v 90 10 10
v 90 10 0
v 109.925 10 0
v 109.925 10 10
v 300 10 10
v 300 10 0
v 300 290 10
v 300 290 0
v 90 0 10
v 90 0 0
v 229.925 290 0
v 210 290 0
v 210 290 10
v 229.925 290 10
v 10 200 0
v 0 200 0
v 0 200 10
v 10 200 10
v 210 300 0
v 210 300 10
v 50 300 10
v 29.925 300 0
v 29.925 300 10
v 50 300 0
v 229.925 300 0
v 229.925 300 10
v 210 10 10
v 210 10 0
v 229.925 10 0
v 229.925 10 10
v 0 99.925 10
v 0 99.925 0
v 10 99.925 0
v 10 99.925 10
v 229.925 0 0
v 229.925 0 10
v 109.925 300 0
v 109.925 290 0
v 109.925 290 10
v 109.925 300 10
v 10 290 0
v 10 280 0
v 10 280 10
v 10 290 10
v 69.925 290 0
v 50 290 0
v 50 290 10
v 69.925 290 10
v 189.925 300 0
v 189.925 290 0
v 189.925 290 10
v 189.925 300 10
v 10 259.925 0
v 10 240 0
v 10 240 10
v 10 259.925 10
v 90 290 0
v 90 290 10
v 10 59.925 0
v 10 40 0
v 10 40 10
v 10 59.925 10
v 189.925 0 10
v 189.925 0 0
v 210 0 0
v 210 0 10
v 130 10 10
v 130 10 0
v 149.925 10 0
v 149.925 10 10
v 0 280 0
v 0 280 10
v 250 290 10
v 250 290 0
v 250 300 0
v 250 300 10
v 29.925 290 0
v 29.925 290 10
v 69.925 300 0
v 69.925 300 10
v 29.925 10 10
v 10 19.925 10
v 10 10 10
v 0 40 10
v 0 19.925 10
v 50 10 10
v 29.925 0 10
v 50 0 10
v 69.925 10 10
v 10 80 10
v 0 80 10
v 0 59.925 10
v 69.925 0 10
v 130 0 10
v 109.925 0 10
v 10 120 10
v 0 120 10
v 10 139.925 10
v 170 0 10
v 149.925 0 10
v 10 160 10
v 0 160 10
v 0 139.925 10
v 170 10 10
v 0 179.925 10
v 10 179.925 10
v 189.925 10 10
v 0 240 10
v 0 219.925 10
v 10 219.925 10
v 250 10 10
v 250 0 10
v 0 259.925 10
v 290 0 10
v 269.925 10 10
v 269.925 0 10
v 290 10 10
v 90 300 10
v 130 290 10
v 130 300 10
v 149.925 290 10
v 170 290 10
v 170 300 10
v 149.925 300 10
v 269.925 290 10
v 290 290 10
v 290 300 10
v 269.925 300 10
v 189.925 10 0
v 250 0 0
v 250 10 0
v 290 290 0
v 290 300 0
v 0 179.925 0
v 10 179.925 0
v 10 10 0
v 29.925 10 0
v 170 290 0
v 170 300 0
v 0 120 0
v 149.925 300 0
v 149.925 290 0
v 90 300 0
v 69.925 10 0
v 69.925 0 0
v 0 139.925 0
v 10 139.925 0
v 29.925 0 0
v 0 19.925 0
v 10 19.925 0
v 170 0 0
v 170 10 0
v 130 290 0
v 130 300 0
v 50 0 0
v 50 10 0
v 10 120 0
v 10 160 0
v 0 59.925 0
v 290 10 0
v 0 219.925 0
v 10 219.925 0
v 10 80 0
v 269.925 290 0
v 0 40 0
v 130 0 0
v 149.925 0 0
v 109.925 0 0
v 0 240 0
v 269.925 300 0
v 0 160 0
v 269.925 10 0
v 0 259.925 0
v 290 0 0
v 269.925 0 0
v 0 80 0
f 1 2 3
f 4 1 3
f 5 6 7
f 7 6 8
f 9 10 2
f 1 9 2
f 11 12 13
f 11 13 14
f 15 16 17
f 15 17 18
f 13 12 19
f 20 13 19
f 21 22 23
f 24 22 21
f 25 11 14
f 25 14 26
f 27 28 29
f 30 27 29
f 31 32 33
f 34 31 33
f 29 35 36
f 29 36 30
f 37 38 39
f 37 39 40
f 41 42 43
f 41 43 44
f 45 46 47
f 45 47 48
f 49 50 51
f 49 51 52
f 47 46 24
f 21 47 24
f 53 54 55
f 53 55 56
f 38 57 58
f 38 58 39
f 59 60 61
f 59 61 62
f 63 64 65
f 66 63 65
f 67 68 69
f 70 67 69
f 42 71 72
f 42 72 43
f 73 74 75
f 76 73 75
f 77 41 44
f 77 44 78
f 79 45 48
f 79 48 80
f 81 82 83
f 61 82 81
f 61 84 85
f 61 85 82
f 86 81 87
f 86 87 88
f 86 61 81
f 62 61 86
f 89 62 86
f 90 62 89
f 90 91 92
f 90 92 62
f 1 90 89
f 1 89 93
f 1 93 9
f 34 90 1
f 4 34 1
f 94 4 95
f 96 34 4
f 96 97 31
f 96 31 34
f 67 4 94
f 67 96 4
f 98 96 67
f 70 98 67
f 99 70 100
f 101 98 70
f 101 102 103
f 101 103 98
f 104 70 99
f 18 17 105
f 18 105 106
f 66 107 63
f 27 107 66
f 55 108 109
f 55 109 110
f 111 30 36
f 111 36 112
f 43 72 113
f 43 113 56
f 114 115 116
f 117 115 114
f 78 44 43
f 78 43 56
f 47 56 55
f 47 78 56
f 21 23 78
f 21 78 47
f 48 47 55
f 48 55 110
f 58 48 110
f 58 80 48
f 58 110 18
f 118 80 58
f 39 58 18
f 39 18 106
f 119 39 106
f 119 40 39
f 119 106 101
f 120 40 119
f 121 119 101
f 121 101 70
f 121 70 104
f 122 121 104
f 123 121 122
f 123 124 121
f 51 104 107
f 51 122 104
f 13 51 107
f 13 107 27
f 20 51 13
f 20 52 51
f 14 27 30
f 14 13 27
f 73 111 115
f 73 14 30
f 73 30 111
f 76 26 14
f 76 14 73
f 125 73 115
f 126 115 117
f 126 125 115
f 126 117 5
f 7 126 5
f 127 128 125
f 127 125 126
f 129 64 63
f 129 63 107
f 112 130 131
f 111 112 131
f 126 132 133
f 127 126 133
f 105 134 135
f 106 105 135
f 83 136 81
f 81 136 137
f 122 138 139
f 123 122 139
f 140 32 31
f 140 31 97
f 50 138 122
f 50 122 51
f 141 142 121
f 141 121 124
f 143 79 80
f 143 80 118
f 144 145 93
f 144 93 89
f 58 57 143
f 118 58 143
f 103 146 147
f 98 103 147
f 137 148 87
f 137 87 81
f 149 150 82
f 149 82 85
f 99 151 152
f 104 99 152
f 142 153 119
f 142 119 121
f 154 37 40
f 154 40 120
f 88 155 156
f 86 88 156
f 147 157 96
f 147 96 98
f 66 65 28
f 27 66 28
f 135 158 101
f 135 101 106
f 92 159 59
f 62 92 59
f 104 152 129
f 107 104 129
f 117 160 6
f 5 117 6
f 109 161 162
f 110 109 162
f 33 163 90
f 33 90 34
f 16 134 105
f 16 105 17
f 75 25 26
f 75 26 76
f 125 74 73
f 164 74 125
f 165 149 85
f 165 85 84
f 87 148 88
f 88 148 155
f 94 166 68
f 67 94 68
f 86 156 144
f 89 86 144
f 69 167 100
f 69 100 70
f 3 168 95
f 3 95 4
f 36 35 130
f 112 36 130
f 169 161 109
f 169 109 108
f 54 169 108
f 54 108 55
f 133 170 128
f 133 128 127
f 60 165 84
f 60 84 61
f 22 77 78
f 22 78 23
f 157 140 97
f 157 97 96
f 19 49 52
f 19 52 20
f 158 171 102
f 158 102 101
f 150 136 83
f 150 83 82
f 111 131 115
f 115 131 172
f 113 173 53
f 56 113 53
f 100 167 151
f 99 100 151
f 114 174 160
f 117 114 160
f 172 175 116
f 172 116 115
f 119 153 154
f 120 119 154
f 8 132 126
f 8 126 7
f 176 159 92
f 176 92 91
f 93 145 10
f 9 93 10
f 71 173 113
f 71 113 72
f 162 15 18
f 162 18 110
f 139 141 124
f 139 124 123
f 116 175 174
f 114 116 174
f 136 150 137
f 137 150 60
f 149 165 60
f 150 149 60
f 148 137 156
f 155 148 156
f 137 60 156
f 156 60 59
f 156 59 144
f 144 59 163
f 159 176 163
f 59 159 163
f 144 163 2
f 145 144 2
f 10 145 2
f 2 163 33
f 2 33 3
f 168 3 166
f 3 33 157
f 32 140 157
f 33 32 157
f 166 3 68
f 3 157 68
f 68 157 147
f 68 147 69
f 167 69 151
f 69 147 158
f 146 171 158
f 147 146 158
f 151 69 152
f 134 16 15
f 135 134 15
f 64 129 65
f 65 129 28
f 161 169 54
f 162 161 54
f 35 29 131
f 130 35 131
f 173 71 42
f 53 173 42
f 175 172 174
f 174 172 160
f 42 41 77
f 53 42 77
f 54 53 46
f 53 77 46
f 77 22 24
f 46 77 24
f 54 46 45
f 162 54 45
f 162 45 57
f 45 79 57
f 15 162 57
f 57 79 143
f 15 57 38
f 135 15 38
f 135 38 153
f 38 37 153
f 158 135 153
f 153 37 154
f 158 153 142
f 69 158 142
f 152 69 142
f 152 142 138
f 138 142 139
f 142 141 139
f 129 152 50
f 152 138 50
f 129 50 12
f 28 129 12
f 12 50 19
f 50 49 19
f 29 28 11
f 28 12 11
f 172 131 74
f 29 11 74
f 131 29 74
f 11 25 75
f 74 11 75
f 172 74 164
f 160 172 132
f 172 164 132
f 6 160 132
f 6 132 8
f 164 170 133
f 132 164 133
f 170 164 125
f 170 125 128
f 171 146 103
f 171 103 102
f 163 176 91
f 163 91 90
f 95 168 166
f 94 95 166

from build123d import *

# Parameters (mm, degrees)
F0_W     = 300
F0_H     = 300
F1_DEPTH = 10
F2_W     = 10
F2_H     = 10
F2_W_2   = 19.925
F2_H_2   = 9.925
F2_H_3   = 19.925
F3_DEPTH = 10.001


with BuildPart() as f1:
    # F0 (on Top) → F1 (new body)
    with BuildSketch(Plane.XY):
        with Locations((150, 150)):
            Rectangle(F0_W, F0_H)
    extrude(amount=F1_DEPTH)

    # F2 (on face) → F3 (cut, through all)
    with BuildSketch(Plane.XY):
        with Locations((295, 295)):
            Rectangle(F2_W, F2_H)
        with Locations((259.9625, 295)):
            Rectangle(F2_W_2, F2_H)
        with Locations((219.9625, 295)):
            Rectangle(F2_W_2, F2_H)
        with Locations((179.9625, 295)):
            Rectangle(F2_W_2, F2_H)
        with Locations((139.9625, 295)):
            Rectangle(F2_W_2, F2_H)
        with Locations((99.9625, 295)):
            Rectangle(F2_W_2, F2_H)
        with Locations((59.9625, 295)):
            Rectangle(F2_W_2, F2_H)
        Polygon((29.925, 290), (29.925, 300), (-24.5567484915, 300), (-24.5567484915, 290), (0, 290), (0, 299.925), (10, 299.925), (10, 290), align=None)
        with Locations((5, 285)):
            Rectangle(F2_W, F2_H)
        with Locations((5, 294.9625)):
            Rectangle(F2_W, F2_H_2)
        with Locations((295, 5)):
            Rectangle(F2_W, F2_H)
        with Locations((259.9625, 5)):
            Rectangle(F2_W_2, F2_H)
        with Locations((219.9625, 5)):
            Rectangle(F2_W_2, F2_H)
        with Locations((179.9625, 5)):
            Rectangle(F2_W_2, F2_H)
        with Locations((139.9625, 5)):
            Rectangle(F2_W_2, F2_H)
        with Locations((99.9625, 5)):
            Rectangle(F2_W_2, F2_H)
        with Locations((59.9625, 5)):
            Rectangle(F2_W_2, F2_H)
        with Locations((19.9625, 5)):
            Rectangle(F2_W_2, F2_H)
        Polygon((0, 0), (10, 0), (10, 10), (10, 19.925), (0, 19.925), align=None)
        with Locations((5, 49.9625)):
            Rectangle(F2_W, F2_H_3)
        with Locations((5, 89.9625)):
            Rectangle(F2_W, F2_H_3)
        with Locations((5, 129.9625)):
            Rectangle(F2_W, F2_H_3)
        with Locations((5, 169.9625)):
            Rectangle(F2_W, F2_H_3)
        with Locations((5, 209.9625)):
            Rectangle(F2_W, F2_H_3)
        with Locations((5, 249.9625)):
            Rectangle(F2_W, F2_H_3)
    extrude(amount=F3_DEPTH, mode=Mode.SUBTRACT)


solid = f1.part
